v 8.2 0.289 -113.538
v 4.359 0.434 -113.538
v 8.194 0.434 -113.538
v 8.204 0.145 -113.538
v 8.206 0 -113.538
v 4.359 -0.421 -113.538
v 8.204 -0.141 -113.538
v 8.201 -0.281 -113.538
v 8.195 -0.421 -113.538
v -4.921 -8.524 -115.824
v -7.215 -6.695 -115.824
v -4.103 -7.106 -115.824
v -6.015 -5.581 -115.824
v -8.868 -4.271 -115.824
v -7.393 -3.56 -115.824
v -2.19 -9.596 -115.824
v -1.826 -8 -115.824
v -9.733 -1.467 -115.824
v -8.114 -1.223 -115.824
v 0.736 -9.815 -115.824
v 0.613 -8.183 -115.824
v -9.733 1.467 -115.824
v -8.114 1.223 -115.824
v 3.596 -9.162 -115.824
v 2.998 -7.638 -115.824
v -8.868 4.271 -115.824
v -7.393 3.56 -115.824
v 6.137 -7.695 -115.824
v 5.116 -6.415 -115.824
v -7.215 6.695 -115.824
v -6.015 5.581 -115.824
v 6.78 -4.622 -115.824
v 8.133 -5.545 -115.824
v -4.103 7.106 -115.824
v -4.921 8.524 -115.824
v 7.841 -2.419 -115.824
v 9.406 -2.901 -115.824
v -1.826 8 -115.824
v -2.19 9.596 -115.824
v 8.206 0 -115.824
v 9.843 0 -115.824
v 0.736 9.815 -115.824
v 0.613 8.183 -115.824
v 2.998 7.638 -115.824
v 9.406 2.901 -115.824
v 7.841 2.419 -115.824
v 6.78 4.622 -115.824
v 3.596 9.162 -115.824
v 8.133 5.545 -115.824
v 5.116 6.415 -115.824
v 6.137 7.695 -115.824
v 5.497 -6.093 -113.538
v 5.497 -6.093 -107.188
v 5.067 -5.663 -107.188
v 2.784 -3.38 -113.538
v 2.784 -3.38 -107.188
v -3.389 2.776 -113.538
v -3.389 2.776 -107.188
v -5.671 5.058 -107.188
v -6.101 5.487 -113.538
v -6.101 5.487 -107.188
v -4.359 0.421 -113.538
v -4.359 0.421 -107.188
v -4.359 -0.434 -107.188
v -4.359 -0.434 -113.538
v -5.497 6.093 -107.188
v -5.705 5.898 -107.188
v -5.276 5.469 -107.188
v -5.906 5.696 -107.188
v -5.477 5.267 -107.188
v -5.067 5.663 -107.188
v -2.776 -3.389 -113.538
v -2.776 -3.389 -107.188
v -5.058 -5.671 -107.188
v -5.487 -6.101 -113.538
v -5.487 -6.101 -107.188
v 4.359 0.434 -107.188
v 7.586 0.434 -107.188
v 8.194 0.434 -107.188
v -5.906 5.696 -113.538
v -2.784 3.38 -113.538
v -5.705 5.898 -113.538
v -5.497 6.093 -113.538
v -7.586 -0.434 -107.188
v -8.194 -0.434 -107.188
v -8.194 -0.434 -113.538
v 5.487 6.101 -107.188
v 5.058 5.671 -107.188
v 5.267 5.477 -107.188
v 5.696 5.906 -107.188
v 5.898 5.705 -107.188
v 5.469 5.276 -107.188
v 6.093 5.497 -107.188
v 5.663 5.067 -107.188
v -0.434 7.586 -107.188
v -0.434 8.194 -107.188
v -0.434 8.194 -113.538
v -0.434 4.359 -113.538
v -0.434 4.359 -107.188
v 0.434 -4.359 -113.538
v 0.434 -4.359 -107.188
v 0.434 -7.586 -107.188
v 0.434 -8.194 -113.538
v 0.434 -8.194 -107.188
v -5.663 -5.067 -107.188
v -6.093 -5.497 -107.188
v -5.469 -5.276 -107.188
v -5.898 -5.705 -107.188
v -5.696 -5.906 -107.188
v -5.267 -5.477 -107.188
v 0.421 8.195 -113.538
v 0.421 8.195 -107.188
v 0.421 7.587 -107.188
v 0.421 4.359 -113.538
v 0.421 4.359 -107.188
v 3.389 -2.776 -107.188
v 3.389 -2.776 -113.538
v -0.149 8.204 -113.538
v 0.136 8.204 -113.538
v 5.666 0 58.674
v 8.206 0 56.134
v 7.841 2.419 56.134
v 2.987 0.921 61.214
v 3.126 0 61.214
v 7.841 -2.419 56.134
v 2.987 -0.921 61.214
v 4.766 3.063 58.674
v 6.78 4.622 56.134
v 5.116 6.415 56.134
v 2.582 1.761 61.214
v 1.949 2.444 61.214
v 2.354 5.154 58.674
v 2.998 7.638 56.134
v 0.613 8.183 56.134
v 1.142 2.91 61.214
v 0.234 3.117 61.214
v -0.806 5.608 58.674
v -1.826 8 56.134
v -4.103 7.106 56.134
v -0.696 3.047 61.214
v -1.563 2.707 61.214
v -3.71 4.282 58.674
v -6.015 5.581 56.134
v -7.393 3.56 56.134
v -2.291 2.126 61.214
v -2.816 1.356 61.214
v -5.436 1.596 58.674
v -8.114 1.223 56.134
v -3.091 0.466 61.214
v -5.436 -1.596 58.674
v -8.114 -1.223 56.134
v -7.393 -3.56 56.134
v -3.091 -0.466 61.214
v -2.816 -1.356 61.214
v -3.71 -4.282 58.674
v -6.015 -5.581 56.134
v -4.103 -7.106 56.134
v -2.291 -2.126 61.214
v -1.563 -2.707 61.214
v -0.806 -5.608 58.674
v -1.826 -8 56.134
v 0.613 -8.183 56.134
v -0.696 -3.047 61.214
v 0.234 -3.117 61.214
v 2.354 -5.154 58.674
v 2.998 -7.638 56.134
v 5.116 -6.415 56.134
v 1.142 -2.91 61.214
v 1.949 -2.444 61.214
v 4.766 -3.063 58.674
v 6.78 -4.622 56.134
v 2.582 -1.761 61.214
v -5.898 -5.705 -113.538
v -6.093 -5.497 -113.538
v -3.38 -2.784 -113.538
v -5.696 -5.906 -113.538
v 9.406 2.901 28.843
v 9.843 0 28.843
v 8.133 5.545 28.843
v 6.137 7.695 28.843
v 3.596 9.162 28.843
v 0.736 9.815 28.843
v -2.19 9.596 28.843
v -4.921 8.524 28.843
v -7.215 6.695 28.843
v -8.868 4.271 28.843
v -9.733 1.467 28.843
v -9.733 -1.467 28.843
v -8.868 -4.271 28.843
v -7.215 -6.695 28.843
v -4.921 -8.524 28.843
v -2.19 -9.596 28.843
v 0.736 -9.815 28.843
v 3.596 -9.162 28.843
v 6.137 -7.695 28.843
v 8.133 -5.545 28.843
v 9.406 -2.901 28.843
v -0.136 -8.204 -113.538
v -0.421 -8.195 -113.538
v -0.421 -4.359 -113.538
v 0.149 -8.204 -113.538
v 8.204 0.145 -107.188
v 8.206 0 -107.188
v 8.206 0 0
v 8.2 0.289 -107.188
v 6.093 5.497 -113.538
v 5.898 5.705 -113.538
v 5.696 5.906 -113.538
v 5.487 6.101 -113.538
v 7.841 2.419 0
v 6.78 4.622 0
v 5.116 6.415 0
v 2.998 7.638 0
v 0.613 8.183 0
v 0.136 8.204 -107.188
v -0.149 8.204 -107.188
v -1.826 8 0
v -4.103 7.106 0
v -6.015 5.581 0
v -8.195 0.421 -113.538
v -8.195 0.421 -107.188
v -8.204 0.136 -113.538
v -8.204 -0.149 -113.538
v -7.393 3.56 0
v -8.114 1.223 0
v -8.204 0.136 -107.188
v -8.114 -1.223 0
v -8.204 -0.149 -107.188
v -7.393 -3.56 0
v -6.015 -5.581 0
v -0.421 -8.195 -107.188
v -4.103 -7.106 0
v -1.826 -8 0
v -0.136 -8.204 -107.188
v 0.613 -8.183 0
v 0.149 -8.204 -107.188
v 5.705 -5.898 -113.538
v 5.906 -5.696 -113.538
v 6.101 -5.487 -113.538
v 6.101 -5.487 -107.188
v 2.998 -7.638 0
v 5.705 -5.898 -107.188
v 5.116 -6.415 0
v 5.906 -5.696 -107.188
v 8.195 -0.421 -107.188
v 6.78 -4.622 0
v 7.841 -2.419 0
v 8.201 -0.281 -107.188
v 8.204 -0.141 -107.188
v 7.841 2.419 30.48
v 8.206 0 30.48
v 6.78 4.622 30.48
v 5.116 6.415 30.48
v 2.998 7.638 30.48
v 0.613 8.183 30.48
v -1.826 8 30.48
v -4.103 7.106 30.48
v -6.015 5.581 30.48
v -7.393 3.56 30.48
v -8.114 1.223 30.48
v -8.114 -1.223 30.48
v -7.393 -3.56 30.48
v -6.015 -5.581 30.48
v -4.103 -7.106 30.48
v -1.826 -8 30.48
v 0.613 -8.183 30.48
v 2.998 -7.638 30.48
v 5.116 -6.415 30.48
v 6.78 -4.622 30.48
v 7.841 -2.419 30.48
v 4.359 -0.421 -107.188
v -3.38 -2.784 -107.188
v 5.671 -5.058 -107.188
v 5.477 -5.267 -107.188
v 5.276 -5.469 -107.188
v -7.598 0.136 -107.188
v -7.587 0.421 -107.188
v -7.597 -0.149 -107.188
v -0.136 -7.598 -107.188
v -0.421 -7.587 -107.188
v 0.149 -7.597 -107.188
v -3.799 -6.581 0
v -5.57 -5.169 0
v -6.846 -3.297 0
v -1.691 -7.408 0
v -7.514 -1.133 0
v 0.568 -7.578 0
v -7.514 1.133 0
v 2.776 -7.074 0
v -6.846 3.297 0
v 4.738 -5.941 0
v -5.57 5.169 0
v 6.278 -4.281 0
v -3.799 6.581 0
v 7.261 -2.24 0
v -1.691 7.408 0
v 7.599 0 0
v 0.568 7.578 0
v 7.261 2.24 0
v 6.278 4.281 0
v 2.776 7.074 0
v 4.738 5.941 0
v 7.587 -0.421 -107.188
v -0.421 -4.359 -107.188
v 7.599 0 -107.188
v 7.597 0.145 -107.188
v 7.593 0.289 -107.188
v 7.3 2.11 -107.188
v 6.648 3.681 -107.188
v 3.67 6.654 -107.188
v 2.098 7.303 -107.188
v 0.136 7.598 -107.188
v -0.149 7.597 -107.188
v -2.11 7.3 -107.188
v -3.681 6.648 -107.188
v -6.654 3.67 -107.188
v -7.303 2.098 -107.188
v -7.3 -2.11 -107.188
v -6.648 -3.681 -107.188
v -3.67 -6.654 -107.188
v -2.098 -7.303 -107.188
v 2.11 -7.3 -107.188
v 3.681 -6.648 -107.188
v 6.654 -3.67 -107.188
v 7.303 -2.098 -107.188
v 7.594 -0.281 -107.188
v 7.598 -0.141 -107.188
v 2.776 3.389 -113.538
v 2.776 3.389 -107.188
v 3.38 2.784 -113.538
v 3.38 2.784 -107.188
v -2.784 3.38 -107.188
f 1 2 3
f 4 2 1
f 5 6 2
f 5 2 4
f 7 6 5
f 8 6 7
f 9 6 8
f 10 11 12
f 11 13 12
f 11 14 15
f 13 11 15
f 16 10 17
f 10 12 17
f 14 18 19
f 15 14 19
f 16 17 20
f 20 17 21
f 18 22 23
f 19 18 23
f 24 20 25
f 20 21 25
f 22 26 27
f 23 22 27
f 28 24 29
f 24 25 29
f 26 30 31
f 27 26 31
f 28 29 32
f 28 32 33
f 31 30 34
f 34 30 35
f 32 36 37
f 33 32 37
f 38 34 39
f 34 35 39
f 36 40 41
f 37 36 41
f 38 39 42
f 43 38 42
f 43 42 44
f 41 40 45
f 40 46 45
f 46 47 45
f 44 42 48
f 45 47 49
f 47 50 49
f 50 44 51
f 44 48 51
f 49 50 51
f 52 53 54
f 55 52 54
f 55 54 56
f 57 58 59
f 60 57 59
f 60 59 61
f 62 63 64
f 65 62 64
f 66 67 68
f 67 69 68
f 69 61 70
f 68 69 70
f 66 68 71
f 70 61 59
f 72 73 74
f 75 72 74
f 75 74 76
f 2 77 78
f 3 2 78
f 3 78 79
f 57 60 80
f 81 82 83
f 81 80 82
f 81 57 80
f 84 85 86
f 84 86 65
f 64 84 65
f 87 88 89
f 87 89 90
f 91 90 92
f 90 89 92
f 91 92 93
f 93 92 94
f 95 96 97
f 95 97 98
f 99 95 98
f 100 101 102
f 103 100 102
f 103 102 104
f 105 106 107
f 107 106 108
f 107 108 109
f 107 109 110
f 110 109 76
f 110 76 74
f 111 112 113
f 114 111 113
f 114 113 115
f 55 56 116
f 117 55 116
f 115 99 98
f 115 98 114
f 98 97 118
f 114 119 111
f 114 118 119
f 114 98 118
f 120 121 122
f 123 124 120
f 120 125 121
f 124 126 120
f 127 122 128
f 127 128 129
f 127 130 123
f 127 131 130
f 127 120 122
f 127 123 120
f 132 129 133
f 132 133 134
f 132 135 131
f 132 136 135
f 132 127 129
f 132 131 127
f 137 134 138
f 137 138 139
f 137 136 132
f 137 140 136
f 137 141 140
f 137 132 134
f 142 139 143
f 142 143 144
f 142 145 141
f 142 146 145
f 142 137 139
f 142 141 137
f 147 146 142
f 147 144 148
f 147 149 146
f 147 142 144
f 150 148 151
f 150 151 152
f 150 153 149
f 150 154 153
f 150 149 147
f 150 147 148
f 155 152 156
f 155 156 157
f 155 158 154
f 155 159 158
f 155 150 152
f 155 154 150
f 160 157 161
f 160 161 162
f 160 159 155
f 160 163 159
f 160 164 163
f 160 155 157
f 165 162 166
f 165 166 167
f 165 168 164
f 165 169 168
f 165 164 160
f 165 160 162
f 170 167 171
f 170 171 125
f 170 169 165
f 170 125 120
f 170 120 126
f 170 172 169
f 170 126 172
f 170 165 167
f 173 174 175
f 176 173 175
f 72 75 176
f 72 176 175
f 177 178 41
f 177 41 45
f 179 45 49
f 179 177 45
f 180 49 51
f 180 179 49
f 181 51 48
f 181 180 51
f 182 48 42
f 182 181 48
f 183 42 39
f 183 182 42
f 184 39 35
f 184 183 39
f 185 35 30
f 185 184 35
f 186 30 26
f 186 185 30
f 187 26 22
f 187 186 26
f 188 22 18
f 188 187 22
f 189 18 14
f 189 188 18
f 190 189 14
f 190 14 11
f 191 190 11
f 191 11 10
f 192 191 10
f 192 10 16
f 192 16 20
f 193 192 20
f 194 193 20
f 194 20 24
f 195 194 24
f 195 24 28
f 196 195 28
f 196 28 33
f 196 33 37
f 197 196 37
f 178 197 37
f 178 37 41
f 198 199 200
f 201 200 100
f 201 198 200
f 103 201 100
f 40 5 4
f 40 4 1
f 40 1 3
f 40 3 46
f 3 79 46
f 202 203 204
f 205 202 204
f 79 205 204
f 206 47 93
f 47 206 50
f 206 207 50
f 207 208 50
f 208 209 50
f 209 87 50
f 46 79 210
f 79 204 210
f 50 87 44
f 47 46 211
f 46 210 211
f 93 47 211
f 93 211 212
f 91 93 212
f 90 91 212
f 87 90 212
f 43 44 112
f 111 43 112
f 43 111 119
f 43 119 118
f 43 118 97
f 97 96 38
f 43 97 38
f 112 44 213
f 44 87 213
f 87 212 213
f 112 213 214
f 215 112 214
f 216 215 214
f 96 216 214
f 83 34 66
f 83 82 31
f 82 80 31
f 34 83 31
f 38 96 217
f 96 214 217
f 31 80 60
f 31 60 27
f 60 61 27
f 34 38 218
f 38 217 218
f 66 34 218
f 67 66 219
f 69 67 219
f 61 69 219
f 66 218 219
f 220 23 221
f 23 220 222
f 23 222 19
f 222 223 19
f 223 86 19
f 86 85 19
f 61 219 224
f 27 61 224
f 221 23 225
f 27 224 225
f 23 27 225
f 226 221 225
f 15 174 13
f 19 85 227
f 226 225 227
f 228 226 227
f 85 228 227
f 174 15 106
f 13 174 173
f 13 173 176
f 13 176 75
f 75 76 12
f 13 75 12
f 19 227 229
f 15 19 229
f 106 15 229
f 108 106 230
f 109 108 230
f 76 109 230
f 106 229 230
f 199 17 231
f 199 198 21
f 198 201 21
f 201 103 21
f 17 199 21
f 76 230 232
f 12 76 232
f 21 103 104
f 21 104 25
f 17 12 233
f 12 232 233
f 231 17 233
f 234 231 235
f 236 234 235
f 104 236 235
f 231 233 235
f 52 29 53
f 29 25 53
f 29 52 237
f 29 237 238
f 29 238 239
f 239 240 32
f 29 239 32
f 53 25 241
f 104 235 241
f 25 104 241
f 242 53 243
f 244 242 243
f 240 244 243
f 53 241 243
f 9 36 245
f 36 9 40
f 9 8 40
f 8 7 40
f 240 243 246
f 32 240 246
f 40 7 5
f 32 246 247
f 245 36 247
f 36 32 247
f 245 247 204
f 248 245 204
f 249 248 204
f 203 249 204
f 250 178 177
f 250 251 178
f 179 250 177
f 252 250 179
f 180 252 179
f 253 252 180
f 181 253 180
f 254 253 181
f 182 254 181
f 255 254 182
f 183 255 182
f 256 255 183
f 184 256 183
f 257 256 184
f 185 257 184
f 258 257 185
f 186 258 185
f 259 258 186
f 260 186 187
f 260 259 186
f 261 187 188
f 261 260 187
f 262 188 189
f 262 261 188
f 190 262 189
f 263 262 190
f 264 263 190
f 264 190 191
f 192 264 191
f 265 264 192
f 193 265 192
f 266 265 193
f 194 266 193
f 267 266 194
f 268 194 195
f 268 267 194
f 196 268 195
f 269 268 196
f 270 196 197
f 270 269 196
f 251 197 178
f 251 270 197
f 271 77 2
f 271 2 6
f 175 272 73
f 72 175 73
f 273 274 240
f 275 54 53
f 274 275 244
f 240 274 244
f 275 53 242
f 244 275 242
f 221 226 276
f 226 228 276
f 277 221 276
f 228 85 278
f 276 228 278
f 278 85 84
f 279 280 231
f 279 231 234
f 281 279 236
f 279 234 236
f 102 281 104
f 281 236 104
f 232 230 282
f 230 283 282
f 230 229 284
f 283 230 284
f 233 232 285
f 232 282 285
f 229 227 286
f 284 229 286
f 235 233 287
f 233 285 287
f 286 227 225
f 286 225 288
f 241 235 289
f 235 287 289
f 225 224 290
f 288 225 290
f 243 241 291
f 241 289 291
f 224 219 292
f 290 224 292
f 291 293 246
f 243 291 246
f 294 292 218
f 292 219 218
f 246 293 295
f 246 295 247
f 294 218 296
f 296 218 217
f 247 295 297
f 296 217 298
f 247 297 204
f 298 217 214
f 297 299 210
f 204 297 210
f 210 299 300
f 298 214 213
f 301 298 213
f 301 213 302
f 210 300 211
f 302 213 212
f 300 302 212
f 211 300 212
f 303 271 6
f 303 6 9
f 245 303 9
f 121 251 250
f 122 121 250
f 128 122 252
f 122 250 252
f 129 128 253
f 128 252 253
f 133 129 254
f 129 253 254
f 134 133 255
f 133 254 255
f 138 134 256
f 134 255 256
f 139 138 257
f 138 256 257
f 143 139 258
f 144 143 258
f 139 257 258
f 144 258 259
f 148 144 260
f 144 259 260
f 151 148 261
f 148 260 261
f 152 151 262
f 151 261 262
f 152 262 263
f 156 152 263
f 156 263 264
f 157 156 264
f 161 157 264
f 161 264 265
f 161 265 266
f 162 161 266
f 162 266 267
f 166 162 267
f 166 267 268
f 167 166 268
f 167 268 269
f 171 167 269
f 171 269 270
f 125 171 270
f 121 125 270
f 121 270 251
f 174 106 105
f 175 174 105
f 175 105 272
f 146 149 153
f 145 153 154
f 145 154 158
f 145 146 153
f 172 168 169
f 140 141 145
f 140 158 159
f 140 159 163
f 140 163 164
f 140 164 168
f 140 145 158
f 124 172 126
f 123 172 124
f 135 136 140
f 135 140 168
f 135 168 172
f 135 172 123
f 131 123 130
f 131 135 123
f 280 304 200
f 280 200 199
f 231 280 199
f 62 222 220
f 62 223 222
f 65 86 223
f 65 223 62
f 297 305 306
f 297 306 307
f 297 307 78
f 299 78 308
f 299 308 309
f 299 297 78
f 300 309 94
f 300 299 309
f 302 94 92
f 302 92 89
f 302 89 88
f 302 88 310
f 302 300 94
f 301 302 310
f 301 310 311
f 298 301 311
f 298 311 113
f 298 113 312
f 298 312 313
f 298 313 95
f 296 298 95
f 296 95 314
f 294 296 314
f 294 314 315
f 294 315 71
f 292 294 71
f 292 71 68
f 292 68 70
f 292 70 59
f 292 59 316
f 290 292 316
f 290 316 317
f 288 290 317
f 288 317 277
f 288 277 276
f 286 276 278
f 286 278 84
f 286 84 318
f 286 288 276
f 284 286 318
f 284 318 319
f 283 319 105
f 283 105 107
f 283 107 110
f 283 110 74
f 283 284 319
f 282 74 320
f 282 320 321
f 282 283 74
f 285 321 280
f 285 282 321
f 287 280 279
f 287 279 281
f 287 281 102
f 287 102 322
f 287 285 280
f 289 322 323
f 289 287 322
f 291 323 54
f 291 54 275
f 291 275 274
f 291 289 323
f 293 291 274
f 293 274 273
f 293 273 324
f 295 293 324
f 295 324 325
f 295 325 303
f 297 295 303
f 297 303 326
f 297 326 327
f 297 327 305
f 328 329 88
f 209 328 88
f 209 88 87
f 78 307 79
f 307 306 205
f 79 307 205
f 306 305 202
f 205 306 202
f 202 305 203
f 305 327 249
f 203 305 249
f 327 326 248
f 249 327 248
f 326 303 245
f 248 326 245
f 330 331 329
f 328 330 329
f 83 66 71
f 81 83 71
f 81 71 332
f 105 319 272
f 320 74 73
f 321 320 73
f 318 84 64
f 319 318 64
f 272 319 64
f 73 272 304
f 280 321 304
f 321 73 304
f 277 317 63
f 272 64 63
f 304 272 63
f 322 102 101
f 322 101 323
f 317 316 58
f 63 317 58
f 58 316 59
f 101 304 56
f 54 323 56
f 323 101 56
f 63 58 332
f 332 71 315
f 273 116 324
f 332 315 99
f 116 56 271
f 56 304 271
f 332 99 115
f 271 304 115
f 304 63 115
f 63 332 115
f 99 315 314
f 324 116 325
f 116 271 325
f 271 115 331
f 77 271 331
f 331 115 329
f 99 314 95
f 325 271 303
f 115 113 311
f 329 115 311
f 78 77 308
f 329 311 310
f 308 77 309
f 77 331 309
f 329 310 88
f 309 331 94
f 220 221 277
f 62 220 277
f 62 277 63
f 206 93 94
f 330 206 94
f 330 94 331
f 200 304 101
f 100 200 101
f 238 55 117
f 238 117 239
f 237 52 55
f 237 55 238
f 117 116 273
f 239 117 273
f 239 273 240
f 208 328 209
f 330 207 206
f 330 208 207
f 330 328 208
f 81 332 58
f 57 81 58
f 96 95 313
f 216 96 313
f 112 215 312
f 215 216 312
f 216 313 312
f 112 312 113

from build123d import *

# Parameters (mm, degrees)
F0_R        = 9.8428256451
F0_R_2      = 8.2055899986
F1_DEPTH    = 25.4
F2_DEPTH    = 115.824
F3_DEPTH    = 61.214
F3_FACE_R   = 8.2055899986
F6_S5_R     = 9.8428256451
F6_T6_DEPTH = 20
F5_R        = 7.5988621304
F7_DEPTH    = 107.188
F8_W        = 0.8552042418
F8_H        = 3.9967889898
F8_W_2      = 3.9967889898
F8_H_2      = 0.8552042418
F9_DEPTH    = 6.35


# Not quite as in the source:
# - a fillet or chamfer that OpenCascade refuses, or shapes differently, is made with other operations: its cross-section is extruded or revolved along the edge and cut away or added


with BuildPart() as f1:
    # F0 (on Top) → F1 (new body)
    with BuildSketch(Plane.XY):
        Circle(F0_R)
        Circle(F0_R_2, mode=Mode.SUBTRACT)
    extrude(amount=F1_DEPTH)

    # F2 (add): a face of the model
    f2_faces = [f1.faces().sort_by_distance(p)[0] for p in [
        (-9.5644284947, 0, 0),
    ]]
    extrude(f2_faces, amount=F2_DEPTH)

    # F0 (on Top) → F3 (join)
    with BuildSketch(Plane.XY):
        Circle(F0_R_2)
    extrude(amount=F3_DEPTH)

    # F3_face (on face) → F4 section 0
    with BuildSketch(Plane.XY.offset(61.214), mode=Mode.PRIVATE) as f4_s0:
        Circle(F3_FACE_R)
    loft([Vertex(0, 0, 0), f4_s0.sketch])

    # F6: chamfer of 5.08 on 3 edges, made by hand


with BuildPart() as f6_tool2:
    # F6_s3 → F6_t4 (revolve)
    with BuildSketch(Plane.XZ):
        Polygon((13.2855899986, 25.4), (8.2055899986, 30.48), (8.2055899986, 25.4), align=None)
    revolve(axis=Axis((0, 0, 25.4), (0, 0, 1)))

    # F6_s5 → F6_t6 (intersect, symmetric)
    with BuildSketch(Plane.XY.offset(27.9)):
        Circle(F6_S5_R)
    extrude(amount=F6_T6_DEPTH, both=True, mode=Mode.INTERSECT)


with BuildPart() as f1_1:
    add(f1.part)

    # F6_t1: union F6_tool2
    add(f6_tool2.part)

    # F6_s7 → F6_t8 (revolve, cut)
    with BuildSketch(Plane.XZ):
        Polygon((8.2055899986, 56.134), (3.1255899986, 61.214), (8.2055899986, 61.214), align=None)
    revolve(axis=Axis((0, 0, 61.214), (0, 0, 1)), mode=Mode.SUBTRACT)

    # F5 (on Top) → F7 (join)
    with BuildSketch(Plane.XY):
        Circle(F5_R)
    extrude(amount=-F7_DEPTH)

    # F8 (on face) → F9 (join)
    with BuildSketch(Plane(origin=(0, 0, -107.188), x_dir=(1, 0, 0), z_dir=(0, 0, -1))):
        with Locations((0.0061568862, 6.3575312961)):
            Rectangle(F8_W, F8_H)
        Polygon((-6.2065385732, 5.6105250065), (-3.3803819756, 2.7843684089), (-2.7756612569, 3.3890891276), (-5.6018178545, 6.2152457252), align=None)
        with Locations((-6.3575312961, 0.0061568862)):
            Rectangle(F8_W_2, F8_H_2)
        Polygon((-5.6105250065, -6.2065385732), (-2.7843684089, -3.3803819756), (-3.3890891276, -2.7756612569), (-6.2152457252, -5.6018178545), align=None)
        with Locations((-0.0061568862, -6.3575312961)):
            Rectangle(F8_W, F8_H)
        Polygon((6.2065385732, -5.6105250065), (3.3803819756, -2.7843684089), (2.7756612569, -3.3890891276), (5.6018178545, -6.2152457252), align=None)
        with Locations((6.3575312961, -0.0061568862)):
            Rectangle(F8_W_2, F8_H_2)
        Polygon((5.6105250065, 6.2065385732), (2.7843684089, 3.3803819756), (3.3890891276, 2.7756612569), (6.2152457252, 5.6018178545), align=None)
    extrude(amount=F9_DEPTH)


solid = f1_1.part
